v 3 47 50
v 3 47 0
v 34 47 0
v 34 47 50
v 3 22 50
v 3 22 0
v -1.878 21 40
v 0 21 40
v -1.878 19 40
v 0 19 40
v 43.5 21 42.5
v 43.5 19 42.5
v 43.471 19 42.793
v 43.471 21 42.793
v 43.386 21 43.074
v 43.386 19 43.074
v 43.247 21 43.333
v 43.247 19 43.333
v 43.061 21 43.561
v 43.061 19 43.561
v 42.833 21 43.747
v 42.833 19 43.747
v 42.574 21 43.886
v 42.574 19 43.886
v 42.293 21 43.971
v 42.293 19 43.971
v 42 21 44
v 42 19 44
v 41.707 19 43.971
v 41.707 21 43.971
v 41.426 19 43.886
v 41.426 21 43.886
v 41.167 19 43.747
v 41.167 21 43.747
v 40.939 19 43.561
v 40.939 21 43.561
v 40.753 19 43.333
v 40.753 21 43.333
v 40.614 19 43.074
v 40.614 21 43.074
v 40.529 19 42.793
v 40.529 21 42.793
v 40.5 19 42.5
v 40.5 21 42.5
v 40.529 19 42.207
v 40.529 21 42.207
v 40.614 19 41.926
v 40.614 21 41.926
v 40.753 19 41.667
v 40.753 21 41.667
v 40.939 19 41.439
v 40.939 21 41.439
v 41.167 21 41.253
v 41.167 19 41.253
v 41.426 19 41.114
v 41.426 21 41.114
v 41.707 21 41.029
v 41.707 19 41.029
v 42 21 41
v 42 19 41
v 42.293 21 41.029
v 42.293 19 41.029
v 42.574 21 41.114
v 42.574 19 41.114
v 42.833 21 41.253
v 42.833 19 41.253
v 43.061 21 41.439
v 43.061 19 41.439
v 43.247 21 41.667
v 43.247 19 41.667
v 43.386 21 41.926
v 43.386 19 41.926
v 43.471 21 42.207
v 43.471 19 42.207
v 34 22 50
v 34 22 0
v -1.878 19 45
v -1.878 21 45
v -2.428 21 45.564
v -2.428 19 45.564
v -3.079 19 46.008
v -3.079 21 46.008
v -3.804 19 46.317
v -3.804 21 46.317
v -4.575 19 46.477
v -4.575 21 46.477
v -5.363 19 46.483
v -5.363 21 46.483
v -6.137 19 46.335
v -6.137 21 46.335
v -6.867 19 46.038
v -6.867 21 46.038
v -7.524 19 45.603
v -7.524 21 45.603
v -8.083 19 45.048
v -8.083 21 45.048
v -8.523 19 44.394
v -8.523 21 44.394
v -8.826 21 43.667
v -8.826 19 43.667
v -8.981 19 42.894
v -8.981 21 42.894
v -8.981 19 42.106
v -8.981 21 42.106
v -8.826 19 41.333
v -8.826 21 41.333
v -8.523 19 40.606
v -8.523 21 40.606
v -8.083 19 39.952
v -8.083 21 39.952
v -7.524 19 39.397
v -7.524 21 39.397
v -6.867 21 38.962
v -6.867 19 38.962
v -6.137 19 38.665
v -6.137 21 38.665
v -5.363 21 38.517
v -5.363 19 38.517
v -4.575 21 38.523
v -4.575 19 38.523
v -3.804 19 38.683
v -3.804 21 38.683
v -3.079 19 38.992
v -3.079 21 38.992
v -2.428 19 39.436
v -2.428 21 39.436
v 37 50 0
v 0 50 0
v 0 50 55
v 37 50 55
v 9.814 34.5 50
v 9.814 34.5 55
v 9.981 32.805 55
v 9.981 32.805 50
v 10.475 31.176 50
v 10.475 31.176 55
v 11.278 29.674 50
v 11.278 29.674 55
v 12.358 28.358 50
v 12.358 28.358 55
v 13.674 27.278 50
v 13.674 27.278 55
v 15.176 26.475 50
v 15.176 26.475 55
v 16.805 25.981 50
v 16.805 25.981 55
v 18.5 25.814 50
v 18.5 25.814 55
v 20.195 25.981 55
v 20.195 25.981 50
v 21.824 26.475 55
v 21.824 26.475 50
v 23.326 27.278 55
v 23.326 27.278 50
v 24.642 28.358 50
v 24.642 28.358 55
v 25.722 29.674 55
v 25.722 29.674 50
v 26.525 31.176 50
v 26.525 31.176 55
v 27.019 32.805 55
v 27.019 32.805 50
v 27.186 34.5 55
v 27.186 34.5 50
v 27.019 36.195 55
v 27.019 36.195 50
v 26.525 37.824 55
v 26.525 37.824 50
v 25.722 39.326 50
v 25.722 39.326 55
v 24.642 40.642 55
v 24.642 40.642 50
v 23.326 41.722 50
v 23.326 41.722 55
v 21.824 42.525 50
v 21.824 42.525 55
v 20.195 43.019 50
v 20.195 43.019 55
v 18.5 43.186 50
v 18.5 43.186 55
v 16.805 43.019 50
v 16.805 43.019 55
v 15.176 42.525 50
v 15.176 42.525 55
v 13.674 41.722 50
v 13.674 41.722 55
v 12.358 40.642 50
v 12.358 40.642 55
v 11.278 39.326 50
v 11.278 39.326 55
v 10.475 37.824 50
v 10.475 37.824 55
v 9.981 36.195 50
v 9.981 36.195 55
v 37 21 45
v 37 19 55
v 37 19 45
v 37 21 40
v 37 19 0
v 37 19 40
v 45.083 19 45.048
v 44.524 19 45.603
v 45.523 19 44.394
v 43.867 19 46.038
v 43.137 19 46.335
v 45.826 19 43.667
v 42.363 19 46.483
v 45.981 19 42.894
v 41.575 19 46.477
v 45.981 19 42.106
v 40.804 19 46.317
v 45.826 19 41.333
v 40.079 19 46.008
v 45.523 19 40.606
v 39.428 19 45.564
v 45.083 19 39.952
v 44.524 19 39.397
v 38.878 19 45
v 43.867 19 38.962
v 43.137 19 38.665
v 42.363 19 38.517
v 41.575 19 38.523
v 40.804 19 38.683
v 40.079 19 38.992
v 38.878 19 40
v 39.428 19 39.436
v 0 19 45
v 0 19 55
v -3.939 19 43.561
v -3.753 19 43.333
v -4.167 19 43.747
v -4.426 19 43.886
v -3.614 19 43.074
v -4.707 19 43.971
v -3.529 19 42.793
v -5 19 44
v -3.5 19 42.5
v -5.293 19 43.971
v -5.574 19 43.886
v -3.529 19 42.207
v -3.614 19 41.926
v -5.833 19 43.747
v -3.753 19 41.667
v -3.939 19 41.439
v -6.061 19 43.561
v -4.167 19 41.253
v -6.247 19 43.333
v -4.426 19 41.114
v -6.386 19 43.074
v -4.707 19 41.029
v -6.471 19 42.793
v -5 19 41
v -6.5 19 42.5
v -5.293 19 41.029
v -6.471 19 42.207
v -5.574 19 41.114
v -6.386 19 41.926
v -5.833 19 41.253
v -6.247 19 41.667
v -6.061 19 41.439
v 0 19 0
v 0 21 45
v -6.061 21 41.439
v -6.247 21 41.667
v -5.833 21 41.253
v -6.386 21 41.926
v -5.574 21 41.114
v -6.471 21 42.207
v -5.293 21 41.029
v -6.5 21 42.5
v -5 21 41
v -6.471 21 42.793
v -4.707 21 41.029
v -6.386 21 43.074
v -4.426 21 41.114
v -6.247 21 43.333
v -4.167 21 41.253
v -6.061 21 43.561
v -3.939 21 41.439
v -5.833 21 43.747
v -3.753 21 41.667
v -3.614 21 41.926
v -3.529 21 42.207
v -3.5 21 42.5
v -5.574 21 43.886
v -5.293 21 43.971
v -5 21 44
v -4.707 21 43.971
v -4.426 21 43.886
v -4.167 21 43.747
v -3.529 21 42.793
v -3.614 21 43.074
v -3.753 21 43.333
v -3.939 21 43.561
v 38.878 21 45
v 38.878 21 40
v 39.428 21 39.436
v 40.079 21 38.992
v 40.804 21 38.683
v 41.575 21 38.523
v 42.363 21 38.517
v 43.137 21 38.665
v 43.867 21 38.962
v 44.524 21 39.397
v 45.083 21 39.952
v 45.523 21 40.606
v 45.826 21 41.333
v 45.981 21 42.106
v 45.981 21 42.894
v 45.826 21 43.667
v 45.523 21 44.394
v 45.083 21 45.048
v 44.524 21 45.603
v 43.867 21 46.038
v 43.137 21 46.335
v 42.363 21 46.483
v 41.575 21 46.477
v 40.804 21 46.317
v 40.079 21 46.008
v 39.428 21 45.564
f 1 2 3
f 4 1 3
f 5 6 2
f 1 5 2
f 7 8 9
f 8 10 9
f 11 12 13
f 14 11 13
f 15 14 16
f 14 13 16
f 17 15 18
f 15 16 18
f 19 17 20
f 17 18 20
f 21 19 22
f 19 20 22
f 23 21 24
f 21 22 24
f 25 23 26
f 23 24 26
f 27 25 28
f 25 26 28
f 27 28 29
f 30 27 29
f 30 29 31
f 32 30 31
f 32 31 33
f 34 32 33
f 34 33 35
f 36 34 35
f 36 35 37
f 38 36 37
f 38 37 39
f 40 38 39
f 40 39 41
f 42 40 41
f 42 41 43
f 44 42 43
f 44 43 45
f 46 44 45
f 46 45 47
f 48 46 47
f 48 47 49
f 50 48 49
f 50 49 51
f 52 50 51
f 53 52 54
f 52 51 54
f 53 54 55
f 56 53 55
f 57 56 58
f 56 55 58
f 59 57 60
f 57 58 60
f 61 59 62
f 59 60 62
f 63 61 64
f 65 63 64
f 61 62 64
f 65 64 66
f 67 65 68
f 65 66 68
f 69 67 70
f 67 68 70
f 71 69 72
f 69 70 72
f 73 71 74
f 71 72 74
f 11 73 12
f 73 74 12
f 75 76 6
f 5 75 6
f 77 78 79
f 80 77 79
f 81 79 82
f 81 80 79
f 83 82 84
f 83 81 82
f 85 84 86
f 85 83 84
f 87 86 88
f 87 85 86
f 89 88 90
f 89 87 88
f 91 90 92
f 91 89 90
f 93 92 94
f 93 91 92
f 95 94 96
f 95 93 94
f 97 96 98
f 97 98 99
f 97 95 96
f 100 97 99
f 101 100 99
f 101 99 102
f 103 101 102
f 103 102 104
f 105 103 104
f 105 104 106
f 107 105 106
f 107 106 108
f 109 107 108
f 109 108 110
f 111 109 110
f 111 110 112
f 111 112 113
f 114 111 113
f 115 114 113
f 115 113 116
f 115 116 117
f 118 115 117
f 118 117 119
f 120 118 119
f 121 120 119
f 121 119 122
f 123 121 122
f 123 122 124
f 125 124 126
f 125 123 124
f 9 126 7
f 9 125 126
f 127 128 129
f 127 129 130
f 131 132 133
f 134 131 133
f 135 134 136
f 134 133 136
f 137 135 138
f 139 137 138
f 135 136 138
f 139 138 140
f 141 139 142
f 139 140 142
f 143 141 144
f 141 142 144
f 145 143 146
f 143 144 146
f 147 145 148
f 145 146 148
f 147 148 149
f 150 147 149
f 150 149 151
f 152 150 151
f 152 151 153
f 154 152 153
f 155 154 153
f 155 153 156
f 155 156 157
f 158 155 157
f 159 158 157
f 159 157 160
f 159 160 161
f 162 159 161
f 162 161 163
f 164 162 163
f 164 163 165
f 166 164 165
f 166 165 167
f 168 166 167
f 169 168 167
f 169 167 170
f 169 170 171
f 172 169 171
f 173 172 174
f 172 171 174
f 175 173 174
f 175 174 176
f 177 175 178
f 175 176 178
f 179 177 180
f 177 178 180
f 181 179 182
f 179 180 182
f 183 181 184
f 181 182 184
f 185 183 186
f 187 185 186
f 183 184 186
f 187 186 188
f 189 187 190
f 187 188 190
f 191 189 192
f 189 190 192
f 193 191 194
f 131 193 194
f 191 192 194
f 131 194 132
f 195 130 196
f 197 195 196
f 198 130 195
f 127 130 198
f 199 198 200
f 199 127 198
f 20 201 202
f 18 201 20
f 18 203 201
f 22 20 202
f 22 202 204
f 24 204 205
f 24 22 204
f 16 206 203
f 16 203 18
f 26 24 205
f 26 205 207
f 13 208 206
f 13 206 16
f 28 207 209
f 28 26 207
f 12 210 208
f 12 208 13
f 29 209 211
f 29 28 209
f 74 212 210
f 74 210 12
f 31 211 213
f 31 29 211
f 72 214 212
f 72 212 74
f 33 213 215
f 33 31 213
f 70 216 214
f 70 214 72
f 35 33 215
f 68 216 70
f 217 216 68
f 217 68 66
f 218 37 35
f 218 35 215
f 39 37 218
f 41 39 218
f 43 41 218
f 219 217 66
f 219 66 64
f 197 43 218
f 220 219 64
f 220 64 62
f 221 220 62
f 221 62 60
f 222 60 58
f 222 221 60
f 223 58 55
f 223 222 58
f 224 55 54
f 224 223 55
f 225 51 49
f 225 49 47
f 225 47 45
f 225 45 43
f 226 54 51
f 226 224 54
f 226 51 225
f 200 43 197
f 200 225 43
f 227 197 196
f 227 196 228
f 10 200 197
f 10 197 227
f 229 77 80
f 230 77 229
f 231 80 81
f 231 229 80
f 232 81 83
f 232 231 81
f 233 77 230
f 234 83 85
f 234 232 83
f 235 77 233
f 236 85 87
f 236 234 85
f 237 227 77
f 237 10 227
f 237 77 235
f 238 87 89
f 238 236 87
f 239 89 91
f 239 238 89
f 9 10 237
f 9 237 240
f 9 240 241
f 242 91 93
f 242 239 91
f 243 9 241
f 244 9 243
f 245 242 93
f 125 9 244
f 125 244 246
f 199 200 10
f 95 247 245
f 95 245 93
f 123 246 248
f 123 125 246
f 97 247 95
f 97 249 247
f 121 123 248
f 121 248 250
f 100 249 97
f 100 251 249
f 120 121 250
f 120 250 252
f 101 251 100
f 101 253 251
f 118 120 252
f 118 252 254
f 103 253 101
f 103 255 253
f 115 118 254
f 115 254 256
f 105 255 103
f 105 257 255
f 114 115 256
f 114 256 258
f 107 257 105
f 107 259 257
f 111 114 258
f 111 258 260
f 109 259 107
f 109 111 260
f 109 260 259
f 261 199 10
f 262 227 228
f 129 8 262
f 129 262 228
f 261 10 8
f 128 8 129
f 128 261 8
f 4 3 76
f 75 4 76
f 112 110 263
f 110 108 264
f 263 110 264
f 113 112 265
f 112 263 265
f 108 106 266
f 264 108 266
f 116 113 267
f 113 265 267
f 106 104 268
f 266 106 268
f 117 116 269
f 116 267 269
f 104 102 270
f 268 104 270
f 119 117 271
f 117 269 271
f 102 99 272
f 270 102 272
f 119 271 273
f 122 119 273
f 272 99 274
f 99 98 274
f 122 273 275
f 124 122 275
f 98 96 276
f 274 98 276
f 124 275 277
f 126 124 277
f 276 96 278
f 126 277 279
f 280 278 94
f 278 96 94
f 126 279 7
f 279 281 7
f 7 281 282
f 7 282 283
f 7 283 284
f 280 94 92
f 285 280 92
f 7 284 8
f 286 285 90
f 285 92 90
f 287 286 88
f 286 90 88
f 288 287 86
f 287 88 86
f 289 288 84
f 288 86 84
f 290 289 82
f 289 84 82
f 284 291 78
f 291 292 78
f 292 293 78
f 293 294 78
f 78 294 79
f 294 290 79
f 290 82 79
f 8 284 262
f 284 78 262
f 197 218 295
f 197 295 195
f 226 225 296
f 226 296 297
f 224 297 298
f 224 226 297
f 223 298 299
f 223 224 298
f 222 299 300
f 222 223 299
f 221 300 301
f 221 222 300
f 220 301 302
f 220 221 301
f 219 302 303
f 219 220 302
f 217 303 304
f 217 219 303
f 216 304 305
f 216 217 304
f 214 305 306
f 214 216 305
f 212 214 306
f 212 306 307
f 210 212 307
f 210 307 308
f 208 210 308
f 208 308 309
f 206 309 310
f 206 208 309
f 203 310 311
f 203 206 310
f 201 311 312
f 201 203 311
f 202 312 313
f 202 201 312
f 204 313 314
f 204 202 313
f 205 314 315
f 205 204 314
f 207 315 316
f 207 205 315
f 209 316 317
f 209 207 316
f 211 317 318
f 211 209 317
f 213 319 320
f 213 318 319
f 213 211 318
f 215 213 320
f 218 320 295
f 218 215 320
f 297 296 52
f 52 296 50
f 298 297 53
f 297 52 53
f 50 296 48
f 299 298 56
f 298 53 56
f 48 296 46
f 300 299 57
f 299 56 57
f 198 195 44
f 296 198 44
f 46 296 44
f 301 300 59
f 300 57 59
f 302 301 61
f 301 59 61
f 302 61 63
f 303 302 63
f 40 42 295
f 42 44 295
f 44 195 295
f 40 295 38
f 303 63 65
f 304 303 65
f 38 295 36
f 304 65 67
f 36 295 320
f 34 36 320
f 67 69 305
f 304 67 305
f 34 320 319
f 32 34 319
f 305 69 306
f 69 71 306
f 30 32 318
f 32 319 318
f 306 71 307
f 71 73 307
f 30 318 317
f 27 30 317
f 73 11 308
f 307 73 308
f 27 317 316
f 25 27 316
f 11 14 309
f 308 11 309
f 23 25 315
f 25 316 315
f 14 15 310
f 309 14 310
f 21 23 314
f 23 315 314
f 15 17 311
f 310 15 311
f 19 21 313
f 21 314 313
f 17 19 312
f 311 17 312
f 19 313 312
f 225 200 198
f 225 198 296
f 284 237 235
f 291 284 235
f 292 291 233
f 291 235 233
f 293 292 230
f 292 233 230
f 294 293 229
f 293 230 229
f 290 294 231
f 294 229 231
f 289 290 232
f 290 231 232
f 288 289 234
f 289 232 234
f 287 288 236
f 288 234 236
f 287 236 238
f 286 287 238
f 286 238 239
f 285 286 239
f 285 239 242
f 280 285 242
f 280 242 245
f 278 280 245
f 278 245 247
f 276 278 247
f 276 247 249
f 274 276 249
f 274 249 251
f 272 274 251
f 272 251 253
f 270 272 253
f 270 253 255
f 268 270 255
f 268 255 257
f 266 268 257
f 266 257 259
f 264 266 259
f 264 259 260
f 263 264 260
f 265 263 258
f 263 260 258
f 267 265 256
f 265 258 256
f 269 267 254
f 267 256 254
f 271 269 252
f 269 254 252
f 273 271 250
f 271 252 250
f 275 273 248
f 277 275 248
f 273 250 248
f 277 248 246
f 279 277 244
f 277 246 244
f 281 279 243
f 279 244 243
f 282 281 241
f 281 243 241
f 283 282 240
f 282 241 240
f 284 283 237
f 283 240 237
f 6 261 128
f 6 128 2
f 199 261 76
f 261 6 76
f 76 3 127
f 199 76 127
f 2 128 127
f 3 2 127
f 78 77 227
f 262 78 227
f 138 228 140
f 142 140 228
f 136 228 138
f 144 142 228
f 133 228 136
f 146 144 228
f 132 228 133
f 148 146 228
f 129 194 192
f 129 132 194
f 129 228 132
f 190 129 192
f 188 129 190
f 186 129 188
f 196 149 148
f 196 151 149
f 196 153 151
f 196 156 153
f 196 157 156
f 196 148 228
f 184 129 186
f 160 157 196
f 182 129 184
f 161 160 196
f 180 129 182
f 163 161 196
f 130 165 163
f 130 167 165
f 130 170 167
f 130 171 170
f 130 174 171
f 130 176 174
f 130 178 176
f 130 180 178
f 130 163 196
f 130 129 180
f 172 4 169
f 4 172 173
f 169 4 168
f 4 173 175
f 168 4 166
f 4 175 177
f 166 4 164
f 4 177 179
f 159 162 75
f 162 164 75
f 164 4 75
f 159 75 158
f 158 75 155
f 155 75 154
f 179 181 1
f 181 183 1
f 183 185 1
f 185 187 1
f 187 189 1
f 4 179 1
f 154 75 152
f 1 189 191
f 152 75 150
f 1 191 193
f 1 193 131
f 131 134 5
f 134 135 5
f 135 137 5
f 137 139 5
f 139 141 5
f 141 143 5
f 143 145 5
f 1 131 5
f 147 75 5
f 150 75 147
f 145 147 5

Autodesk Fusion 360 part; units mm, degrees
sketch "Sketch1" plane through (0, 0, 0) normal (0, 0, 1) x (1, 0, 0)
  line L0 (0, 50) -> (37, 50)
  line L1 (37, 50) -> (37, 19)
  line L2 (37, 19) -> (0, 19)
  line L3 (0, 19) -> (0, 50)
  line L4 (3, 22) -> (3, 47)
  line L5 (3, 47) -> (34, 47)
  line L6 (34, 47) -> (34, 22)
  line L7 (34, 22) -> (3, 22)
  dimension "d1" = 37
  dimension "d2" = 31
  dimension "d3" = 3
extrude "Extrude1" add sketch "Sketch1" along normal blind 55
sketch "Sketch2" plane through (0, 0, 55) normal (0, 0, 1) x (-1, 0, 0)
  line L0 (-34, -47) -> (-34, -22)
  line L1 (-34, -22) -> (-3, -22)
  line L2 (-3, -22) -> (-3, -47)
  line L3 (-3, -47) -> (-34, -47)
  line L4 (0, -19) -> (-37, -19)
  line L5 (-37, -19) -> (-37, -50)
  line L6 (-37, -50) -> (0, -50)
  line L7 (0, -50) -> (0, -19)
  line L8 (0, -50) -> (-37, -50)
  line L9 (-37, -50) -> (-37, -19)
  line L10 (-37, -19) -> (0, -19)
  line L11 (0, -19) -> (0, -50)
  circle A0 centre (-18.5, -34.5) radius 8.6861
extrude "Extrude2" add sketch "Sketch2" against normal blind 5 contours L0 L1 L2 L3 | L4 L5 L6 L7 L8 L9 L10 L11
sketch "Sketch3" plane through (0, 19, 0) normal (0, -1, 0) x (1, 0, 0)
  line L0 (0, 55) -> (0, 0)
  line L1 (0, 0) -> (37, 0)
  line L2 (37, 0) -> (37, 55)
  line L3 (37, 55) -> (0, 55)
  line L4 (0, 40) -> (-5, 40)
  line L5 (-5, 40) -> (-5, 45)
  line L6 (-5, 45) -> (0, 45)
  line L7 (0, 45) -> (0, 40)
  line L8 (37, 40) -> (42, 40)
  line L9 (42, 40) -> (42, 45)
  line L10 (42, 45) -> (37, 45)
  circle A0 centre (-5, 42.5) radius 1.5
  circle A1 centre (-5, 42.5) radius 4
  circle A2 centre (42, 42.5) radius 1.5
  circle A3 centre (42, 42.5) radius 4
  line L11 (35, 40) -> (38, 40)
  line L12 (38, 40) -> (38, 45)
  line L13 (38, 45) -> (35, 45)
  line L14 (1.6164, 40) -> (-1, 40)
  line L15 (-1, 40) -> (-1, 45)
  line L16 (-1, 45) -> (1.6164, 45)
  line L17 (35, 40) -> (35, 45)
  line L18 (1.6164, 40) -> (1.6164, 45)
  dimension "d9" = 5
  dimension "d10" = 3
  dimension "d11" = 2.5
  dimension "d12" = 3
  dimension "d13" = 2.5
extrude "Extrude3" add sketch "Sketch3" against normal blind 2 contours L0 L7 L14 L16 L18 | L0 L4 L6 L7 L14 L15 L16 | L6 A1 L15 | L2 L8 L10 L11 L12 L13 | L2 L11 L13 L17 | L4 A1 L15 | L4 L5 L6 A0 A1 | L4 L5 L6 A0 A1 | L10 A3 L12 | L8 A3 L12 | L8 L9 L10 A2 A3 | L8 L9 L10 A2 A3
